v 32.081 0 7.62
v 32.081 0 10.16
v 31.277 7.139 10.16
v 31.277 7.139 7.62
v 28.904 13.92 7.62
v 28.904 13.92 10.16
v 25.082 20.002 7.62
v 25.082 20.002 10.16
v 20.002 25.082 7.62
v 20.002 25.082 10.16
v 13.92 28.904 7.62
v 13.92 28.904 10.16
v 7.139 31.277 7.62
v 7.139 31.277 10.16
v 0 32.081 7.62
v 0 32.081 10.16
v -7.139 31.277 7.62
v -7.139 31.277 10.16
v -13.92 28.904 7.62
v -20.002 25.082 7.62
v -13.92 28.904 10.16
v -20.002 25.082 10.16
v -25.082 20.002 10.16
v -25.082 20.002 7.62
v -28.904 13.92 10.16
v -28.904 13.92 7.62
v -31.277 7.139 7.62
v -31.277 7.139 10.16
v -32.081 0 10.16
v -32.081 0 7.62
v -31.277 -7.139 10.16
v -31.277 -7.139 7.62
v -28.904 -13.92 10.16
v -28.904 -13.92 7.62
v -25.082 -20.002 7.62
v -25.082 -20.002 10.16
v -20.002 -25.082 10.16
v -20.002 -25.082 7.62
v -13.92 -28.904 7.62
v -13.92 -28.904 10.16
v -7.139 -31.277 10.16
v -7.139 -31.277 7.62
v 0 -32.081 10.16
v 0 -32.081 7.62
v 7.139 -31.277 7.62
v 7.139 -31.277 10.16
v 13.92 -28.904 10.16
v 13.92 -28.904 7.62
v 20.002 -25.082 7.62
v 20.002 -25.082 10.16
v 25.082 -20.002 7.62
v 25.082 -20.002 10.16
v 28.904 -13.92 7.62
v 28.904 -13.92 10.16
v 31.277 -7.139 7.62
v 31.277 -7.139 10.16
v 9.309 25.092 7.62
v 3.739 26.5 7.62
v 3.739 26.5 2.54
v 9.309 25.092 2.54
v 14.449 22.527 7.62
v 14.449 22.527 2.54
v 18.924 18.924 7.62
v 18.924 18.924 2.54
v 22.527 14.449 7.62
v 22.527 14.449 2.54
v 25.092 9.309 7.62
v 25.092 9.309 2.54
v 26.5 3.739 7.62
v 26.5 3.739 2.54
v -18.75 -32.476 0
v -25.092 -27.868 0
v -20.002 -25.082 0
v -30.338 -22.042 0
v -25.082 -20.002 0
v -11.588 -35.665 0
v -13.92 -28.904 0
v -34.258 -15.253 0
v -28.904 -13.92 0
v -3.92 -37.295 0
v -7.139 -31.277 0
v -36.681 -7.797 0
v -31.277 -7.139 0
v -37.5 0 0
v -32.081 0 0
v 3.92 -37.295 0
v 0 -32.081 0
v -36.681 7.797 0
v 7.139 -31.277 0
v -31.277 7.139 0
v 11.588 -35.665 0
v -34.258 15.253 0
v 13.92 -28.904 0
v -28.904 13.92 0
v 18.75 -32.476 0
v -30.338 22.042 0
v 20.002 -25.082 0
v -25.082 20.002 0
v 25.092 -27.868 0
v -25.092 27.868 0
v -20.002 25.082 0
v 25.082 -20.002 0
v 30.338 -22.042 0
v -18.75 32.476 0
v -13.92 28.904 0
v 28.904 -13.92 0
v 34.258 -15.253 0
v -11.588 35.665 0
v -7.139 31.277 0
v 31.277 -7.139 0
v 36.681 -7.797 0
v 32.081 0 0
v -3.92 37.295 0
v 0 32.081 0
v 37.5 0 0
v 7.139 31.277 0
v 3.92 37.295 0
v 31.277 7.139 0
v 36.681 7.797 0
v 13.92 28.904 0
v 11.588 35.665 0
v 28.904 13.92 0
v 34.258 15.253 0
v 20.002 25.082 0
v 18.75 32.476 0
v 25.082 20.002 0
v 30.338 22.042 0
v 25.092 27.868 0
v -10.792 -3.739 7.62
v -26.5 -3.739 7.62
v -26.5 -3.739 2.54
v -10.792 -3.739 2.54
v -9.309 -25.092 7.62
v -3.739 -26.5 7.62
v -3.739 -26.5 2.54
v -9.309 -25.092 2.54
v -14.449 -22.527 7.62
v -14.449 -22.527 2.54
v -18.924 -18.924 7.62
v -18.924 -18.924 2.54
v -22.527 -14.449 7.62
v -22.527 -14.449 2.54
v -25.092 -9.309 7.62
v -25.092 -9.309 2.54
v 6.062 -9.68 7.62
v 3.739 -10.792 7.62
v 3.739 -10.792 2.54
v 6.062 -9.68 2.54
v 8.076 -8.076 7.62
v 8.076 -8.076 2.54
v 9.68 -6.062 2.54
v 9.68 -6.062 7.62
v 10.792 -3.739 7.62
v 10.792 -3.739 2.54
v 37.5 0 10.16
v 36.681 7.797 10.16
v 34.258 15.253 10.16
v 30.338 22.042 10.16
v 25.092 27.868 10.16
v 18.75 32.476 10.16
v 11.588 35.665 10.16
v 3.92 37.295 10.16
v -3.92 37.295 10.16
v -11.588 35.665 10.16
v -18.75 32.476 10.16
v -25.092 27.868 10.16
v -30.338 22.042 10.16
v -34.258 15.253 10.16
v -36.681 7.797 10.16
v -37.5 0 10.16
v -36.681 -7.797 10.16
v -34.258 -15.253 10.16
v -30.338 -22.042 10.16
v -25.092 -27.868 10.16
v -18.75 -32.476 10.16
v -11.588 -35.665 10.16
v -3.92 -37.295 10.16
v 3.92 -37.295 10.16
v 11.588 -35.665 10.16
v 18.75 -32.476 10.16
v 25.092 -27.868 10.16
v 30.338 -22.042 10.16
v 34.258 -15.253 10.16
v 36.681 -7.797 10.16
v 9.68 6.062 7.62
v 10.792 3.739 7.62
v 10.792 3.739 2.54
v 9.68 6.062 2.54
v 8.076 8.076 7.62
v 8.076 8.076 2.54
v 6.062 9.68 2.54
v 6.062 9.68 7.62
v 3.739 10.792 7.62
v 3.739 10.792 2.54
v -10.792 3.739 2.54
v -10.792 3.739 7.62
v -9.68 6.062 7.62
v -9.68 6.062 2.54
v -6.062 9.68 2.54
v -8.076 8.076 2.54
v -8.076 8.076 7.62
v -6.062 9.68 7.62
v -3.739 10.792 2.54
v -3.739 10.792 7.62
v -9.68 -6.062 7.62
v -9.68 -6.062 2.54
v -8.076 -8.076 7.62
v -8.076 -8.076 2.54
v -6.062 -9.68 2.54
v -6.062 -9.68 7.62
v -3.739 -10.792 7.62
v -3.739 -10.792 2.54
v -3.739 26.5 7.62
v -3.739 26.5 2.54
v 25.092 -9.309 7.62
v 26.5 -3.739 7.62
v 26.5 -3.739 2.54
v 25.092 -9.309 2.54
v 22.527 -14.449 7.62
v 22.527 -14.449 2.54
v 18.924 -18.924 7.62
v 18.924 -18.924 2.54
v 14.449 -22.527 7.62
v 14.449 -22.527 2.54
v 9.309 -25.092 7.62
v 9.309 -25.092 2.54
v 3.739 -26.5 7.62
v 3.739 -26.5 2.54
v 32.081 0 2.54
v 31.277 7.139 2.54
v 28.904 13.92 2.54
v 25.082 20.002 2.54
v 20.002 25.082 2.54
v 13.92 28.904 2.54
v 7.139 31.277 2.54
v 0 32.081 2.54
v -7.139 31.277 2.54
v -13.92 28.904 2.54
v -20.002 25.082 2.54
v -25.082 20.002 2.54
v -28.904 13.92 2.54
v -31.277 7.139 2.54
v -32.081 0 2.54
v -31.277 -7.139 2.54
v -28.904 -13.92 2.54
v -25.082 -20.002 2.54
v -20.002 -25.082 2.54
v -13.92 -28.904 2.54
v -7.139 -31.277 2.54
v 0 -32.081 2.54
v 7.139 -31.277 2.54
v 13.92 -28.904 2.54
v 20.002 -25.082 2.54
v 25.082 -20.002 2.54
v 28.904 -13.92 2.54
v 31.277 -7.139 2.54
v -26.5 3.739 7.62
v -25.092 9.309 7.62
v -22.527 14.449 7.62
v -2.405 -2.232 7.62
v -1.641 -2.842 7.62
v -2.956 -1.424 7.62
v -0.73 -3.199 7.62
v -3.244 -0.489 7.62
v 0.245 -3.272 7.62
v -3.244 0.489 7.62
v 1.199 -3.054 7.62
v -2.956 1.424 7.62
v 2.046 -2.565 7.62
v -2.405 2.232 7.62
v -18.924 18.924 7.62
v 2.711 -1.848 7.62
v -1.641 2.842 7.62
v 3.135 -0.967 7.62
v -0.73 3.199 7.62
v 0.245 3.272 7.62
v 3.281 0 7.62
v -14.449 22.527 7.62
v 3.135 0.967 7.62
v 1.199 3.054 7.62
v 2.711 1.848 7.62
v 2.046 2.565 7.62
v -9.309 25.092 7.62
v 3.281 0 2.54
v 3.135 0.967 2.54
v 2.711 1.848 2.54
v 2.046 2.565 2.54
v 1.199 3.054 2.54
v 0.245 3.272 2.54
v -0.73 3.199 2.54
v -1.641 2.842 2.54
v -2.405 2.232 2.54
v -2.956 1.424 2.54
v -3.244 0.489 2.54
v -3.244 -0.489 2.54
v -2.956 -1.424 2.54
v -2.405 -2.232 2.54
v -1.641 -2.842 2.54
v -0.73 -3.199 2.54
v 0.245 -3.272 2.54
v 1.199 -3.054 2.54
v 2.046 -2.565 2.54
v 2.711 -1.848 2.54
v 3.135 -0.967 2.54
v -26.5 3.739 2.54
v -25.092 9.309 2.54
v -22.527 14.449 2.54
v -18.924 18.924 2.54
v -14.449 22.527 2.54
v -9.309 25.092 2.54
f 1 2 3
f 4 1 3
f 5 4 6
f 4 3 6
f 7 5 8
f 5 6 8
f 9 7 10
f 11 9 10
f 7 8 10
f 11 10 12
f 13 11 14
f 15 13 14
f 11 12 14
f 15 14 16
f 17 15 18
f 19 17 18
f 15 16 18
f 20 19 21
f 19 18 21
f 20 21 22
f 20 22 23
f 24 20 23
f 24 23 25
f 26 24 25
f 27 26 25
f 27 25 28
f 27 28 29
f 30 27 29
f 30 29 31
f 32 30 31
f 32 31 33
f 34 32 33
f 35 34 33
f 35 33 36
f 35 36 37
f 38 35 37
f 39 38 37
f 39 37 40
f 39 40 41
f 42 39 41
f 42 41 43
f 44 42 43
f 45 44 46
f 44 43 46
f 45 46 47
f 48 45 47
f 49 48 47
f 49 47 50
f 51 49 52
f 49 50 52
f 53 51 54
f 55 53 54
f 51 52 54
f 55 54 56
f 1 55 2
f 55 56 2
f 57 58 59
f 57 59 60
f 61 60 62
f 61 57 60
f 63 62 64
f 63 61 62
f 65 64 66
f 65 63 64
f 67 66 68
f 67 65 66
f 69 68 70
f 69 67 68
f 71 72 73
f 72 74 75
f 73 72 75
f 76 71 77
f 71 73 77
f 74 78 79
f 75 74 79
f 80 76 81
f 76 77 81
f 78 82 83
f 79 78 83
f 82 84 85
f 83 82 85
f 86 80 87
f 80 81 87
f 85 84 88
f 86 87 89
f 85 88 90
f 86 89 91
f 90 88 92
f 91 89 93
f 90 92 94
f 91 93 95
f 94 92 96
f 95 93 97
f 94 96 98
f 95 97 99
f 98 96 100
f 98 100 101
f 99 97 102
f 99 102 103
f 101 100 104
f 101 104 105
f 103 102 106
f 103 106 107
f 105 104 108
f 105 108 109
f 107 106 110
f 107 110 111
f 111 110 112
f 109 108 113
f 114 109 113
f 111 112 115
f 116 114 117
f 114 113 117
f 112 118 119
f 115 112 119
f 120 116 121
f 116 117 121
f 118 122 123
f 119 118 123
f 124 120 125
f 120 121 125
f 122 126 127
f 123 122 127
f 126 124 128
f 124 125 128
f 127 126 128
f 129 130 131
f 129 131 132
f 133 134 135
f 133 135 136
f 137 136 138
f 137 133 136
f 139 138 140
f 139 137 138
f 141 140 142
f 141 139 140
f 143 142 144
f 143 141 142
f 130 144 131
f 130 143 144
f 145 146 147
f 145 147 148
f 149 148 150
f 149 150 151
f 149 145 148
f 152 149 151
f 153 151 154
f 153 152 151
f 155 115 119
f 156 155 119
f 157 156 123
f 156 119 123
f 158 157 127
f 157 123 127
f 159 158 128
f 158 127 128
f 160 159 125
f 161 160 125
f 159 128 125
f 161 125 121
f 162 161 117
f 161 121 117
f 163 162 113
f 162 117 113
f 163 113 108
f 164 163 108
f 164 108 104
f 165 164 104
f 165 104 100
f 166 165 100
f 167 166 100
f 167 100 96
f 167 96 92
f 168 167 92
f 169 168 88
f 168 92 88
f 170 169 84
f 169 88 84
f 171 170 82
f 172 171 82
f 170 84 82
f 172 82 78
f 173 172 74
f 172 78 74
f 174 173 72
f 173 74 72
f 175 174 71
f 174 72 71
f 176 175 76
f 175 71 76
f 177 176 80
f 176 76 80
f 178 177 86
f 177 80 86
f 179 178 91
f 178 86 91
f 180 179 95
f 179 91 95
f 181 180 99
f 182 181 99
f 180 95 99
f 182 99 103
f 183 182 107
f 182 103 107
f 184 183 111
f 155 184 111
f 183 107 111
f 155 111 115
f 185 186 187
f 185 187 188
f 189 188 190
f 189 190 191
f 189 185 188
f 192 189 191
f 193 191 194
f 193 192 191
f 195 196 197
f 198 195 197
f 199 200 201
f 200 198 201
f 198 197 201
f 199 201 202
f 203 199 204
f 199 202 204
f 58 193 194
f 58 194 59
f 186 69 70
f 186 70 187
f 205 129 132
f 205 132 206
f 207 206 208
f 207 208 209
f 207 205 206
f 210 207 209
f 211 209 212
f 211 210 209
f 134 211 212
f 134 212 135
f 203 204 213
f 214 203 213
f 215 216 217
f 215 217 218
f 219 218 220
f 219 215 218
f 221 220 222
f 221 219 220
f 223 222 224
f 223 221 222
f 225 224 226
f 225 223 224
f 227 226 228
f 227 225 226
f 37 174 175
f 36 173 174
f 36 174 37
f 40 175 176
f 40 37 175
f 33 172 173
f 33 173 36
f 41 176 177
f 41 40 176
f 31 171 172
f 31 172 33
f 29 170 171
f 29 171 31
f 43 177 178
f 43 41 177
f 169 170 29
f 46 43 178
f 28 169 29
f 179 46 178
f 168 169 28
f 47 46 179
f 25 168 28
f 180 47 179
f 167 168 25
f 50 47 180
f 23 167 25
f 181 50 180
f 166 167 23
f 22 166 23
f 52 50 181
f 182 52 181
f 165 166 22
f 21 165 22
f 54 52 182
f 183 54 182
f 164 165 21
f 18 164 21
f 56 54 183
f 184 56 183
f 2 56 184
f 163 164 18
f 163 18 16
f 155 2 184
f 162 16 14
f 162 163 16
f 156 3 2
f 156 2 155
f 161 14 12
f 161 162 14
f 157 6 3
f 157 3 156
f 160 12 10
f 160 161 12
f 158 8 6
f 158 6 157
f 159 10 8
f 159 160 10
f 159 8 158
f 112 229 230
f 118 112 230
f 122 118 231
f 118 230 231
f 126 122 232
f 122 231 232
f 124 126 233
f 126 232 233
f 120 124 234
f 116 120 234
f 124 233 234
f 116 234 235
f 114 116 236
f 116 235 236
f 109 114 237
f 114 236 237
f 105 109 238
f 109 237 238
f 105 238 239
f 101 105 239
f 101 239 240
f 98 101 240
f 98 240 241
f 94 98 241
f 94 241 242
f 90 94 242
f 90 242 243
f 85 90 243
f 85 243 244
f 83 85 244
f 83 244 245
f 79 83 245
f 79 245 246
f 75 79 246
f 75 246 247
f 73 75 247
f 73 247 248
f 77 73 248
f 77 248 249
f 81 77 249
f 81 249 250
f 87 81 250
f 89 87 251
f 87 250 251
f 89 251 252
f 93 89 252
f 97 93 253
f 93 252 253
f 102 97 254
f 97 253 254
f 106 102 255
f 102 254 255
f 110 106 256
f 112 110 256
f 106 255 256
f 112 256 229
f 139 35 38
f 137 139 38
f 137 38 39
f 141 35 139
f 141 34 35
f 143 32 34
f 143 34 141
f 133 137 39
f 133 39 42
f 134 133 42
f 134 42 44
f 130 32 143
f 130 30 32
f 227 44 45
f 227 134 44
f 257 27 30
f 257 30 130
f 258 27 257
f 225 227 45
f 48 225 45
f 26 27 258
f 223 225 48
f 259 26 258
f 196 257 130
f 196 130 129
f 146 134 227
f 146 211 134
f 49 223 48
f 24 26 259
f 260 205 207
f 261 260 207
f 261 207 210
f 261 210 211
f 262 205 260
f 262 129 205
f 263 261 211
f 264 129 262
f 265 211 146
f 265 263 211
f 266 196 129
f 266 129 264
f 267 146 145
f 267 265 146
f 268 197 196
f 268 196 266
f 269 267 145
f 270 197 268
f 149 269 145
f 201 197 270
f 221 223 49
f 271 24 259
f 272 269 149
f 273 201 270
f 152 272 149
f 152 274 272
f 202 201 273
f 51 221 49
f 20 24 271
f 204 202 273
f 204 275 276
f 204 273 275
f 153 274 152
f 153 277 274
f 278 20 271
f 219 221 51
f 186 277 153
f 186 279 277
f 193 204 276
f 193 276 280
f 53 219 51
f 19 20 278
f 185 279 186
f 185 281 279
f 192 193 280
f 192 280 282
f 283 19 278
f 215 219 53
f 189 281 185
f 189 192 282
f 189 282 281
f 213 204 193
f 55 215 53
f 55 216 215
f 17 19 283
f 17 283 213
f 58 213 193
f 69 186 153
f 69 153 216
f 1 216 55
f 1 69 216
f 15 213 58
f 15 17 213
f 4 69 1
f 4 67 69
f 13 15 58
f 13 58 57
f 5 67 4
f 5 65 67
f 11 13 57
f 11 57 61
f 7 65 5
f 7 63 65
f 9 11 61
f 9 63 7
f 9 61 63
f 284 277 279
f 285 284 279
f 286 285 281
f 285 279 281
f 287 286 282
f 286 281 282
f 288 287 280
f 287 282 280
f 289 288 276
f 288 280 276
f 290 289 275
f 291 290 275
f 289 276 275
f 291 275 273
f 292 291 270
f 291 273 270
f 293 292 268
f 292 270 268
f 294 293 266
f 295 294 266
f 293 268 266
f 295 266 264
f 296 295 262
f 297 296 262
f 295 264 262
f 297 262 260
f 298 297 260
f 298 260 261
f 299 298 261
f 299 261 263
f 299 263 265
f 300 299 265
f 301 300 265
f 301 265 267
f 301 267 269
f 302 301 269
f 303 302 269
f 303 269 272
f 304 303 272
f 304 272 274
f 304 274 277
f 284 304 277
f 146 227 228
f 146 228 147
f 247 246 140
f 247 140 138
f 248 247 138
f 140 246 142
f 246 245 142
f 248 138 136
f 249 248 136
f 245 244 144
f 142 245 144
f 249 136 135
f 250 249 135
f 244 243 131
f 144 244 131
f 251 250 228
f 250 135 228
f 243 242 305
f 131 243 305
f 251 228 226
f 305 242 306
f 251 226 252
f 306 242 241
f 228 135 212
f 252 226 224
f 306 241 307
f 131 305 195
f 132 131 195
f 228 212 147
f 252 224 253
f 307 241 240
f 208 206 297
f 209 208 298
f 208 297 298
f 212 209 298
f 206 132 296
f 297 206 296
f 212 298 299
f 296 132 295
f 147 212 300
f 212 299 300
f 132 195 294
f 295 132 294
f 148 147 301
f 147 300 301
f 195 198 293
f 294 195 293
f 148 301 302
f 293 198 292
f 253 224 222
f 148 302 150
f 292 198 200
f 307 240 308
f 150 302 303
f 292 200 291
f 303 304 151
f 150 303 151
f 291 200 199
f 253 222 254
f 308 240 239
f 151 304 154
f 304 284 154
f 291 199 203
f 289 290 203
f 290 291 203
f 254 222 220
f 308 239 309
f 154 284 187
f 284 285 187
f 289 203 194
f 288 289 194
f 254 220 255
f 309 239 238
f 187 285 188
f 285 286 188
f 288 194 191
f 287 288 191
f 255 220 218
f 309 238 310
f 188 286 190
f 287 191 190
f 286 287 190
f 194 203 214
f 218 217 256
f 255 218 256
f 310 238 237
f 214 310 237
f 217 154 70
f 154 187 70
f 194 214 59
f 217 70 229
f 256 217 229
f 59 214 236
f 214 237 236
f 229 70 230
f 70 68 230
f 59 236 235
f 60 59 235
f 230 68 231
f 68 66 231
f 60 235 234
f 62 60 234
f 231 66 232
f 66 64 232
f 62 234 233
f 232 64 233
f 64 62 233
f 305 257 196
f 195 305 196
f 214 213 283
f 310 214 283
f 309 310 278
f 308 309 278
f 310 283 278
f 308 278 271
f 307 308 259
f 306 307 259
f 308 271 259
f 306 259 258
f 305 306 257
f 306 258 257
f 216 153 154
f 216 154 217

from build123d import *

# Parameters (mm, degrees)
SKETCH1_R                = 37.5
BOSS_EXTRUDE1_DEPTH      = 10.16
SKETCH2_R                = 32.081215916
CUT_EXTRUDE1_DEPTH       = 10.16
SKETCH4_R                = 32.081215916
BOSS_EXTRUDE3_DEPTH      = 2.54
BOSS_EXTRUDE3_DEPTH_BACK = 2.54
CUT_EXTRUDE2_DEPTH       = 15.24
SKETCH6_R                = 3.281091855
CUT_EXTRUDE3_DEPTH       = 15.24


with BuildPart() as part:
    # Sketch1 → Boss-Extrude1 (new body)
    with BuildSketch(Plane.XY):
        Circle(SKETCH1_R)
    extrude(amount=BOSS_EXTRUDE1_DEPTH)

    # Sketch2 → Cut-Extrude1 (cut)
    with BuildSketch(Plane.XY.offset(10.16)):
        Circle(SKETCH2_R)
    extrude(amount=-CUT_EXTRUDE1_DEPTH, mode=Mode.SUBTRACT)

    # Sketch4 → Boss-Extrude3 (add, two sides)
    with BuildSketch(Plane.XY.offset(5.08)) as boss_extrude3_sk:
        Circle(SKETCH4_R)
    extrude(amount=BOSS_EXTRUDE3_DEPTH)
    extrude(boss_extrude3_sk.sketch, amount=-BOSS_EXTRUDE3_DEPTH_BACK)

    # Sketch5 → Cut-Extrude2 (cut)
    with BuildSketch(Plane.XY.offset(7.62)):
        with BuildLine():
            Line((-3.738926609, 10.791901804), (-3.738926609, 26.50033006))
            ThreePointArc((-3.738926609, 26.50033006), (-18.924152101, 18.924152101), (-26.50033006, 3.738926609))
            Line((-26.50033006, 3.738926609), (-10.791901804, 3.738926609))
            ThreePointArc((-10.791901804, 3.738926609), (-8.076036055, 8.076036055), (-3.738926609, 10.791901804))
        make_face()
        with BuildLine():
            Line((3.738926609, 10.791901804), (3.738926609, 26.50033006))
            ThreePointArc((3.738926609, 26.50033006), (18.924152101, 18.924152101), (26.50033006, 3.738926609))
            Line((26.50033006, 3.738926609), (10.791901804, 3.738926609))
            ThreePointArc((10.791901804, 3.738926609), (8.076036055, 8.076036055), (3.738926609, 10.791901804))
        make_face()
        with BuildLine():
            Line((10.791901804, -3.738926609), (26.50033006, -3.738926609))
            ThreePointArc((26.50033006, -3.738926609), (18.924152101, -18.924152101), (3.738926609, -26.50033006))
            Line((3.738926609, -26.50033006), (3.738926609, -10.791901804))
            ThreePointArc((3.738926609, -10.791901804), (8.076036055, -8.076036055), (10.791901804, -3.738926609))
        make_face()
        with BuildLine():
            Line((-3.738926609, -10.791901804), (-3.738926609, -26.50033006))
            ThreePointArc((-3.738926609, -26.50033006), (-18.924152101, -18.924152101), (-26.50033006, -3.738926609))
            Line((-26.50033006, -3.738926609), (-10.791901804, -3.738926609))
            ThreePointArc((-10.791901804, -3.738926609), (-8.076036055, -8.076036055), (-3.738926609, -10.791901804))
        make_face()
    extrude(amount=-CUT_EXTRUDE2_DEPTH, mode=Mode.SUBTRACT)

    # Sketch6 → Cut-Extrude3 (cut)
    with BuildSketch(Plane.XY.offset(7.62)):
        Circle(SKETCH6_R)
    extrude(amount=-CUT_EXTRUDE3_DEPTH, mode=Mode.SUBTRACT)


solid = part.part
